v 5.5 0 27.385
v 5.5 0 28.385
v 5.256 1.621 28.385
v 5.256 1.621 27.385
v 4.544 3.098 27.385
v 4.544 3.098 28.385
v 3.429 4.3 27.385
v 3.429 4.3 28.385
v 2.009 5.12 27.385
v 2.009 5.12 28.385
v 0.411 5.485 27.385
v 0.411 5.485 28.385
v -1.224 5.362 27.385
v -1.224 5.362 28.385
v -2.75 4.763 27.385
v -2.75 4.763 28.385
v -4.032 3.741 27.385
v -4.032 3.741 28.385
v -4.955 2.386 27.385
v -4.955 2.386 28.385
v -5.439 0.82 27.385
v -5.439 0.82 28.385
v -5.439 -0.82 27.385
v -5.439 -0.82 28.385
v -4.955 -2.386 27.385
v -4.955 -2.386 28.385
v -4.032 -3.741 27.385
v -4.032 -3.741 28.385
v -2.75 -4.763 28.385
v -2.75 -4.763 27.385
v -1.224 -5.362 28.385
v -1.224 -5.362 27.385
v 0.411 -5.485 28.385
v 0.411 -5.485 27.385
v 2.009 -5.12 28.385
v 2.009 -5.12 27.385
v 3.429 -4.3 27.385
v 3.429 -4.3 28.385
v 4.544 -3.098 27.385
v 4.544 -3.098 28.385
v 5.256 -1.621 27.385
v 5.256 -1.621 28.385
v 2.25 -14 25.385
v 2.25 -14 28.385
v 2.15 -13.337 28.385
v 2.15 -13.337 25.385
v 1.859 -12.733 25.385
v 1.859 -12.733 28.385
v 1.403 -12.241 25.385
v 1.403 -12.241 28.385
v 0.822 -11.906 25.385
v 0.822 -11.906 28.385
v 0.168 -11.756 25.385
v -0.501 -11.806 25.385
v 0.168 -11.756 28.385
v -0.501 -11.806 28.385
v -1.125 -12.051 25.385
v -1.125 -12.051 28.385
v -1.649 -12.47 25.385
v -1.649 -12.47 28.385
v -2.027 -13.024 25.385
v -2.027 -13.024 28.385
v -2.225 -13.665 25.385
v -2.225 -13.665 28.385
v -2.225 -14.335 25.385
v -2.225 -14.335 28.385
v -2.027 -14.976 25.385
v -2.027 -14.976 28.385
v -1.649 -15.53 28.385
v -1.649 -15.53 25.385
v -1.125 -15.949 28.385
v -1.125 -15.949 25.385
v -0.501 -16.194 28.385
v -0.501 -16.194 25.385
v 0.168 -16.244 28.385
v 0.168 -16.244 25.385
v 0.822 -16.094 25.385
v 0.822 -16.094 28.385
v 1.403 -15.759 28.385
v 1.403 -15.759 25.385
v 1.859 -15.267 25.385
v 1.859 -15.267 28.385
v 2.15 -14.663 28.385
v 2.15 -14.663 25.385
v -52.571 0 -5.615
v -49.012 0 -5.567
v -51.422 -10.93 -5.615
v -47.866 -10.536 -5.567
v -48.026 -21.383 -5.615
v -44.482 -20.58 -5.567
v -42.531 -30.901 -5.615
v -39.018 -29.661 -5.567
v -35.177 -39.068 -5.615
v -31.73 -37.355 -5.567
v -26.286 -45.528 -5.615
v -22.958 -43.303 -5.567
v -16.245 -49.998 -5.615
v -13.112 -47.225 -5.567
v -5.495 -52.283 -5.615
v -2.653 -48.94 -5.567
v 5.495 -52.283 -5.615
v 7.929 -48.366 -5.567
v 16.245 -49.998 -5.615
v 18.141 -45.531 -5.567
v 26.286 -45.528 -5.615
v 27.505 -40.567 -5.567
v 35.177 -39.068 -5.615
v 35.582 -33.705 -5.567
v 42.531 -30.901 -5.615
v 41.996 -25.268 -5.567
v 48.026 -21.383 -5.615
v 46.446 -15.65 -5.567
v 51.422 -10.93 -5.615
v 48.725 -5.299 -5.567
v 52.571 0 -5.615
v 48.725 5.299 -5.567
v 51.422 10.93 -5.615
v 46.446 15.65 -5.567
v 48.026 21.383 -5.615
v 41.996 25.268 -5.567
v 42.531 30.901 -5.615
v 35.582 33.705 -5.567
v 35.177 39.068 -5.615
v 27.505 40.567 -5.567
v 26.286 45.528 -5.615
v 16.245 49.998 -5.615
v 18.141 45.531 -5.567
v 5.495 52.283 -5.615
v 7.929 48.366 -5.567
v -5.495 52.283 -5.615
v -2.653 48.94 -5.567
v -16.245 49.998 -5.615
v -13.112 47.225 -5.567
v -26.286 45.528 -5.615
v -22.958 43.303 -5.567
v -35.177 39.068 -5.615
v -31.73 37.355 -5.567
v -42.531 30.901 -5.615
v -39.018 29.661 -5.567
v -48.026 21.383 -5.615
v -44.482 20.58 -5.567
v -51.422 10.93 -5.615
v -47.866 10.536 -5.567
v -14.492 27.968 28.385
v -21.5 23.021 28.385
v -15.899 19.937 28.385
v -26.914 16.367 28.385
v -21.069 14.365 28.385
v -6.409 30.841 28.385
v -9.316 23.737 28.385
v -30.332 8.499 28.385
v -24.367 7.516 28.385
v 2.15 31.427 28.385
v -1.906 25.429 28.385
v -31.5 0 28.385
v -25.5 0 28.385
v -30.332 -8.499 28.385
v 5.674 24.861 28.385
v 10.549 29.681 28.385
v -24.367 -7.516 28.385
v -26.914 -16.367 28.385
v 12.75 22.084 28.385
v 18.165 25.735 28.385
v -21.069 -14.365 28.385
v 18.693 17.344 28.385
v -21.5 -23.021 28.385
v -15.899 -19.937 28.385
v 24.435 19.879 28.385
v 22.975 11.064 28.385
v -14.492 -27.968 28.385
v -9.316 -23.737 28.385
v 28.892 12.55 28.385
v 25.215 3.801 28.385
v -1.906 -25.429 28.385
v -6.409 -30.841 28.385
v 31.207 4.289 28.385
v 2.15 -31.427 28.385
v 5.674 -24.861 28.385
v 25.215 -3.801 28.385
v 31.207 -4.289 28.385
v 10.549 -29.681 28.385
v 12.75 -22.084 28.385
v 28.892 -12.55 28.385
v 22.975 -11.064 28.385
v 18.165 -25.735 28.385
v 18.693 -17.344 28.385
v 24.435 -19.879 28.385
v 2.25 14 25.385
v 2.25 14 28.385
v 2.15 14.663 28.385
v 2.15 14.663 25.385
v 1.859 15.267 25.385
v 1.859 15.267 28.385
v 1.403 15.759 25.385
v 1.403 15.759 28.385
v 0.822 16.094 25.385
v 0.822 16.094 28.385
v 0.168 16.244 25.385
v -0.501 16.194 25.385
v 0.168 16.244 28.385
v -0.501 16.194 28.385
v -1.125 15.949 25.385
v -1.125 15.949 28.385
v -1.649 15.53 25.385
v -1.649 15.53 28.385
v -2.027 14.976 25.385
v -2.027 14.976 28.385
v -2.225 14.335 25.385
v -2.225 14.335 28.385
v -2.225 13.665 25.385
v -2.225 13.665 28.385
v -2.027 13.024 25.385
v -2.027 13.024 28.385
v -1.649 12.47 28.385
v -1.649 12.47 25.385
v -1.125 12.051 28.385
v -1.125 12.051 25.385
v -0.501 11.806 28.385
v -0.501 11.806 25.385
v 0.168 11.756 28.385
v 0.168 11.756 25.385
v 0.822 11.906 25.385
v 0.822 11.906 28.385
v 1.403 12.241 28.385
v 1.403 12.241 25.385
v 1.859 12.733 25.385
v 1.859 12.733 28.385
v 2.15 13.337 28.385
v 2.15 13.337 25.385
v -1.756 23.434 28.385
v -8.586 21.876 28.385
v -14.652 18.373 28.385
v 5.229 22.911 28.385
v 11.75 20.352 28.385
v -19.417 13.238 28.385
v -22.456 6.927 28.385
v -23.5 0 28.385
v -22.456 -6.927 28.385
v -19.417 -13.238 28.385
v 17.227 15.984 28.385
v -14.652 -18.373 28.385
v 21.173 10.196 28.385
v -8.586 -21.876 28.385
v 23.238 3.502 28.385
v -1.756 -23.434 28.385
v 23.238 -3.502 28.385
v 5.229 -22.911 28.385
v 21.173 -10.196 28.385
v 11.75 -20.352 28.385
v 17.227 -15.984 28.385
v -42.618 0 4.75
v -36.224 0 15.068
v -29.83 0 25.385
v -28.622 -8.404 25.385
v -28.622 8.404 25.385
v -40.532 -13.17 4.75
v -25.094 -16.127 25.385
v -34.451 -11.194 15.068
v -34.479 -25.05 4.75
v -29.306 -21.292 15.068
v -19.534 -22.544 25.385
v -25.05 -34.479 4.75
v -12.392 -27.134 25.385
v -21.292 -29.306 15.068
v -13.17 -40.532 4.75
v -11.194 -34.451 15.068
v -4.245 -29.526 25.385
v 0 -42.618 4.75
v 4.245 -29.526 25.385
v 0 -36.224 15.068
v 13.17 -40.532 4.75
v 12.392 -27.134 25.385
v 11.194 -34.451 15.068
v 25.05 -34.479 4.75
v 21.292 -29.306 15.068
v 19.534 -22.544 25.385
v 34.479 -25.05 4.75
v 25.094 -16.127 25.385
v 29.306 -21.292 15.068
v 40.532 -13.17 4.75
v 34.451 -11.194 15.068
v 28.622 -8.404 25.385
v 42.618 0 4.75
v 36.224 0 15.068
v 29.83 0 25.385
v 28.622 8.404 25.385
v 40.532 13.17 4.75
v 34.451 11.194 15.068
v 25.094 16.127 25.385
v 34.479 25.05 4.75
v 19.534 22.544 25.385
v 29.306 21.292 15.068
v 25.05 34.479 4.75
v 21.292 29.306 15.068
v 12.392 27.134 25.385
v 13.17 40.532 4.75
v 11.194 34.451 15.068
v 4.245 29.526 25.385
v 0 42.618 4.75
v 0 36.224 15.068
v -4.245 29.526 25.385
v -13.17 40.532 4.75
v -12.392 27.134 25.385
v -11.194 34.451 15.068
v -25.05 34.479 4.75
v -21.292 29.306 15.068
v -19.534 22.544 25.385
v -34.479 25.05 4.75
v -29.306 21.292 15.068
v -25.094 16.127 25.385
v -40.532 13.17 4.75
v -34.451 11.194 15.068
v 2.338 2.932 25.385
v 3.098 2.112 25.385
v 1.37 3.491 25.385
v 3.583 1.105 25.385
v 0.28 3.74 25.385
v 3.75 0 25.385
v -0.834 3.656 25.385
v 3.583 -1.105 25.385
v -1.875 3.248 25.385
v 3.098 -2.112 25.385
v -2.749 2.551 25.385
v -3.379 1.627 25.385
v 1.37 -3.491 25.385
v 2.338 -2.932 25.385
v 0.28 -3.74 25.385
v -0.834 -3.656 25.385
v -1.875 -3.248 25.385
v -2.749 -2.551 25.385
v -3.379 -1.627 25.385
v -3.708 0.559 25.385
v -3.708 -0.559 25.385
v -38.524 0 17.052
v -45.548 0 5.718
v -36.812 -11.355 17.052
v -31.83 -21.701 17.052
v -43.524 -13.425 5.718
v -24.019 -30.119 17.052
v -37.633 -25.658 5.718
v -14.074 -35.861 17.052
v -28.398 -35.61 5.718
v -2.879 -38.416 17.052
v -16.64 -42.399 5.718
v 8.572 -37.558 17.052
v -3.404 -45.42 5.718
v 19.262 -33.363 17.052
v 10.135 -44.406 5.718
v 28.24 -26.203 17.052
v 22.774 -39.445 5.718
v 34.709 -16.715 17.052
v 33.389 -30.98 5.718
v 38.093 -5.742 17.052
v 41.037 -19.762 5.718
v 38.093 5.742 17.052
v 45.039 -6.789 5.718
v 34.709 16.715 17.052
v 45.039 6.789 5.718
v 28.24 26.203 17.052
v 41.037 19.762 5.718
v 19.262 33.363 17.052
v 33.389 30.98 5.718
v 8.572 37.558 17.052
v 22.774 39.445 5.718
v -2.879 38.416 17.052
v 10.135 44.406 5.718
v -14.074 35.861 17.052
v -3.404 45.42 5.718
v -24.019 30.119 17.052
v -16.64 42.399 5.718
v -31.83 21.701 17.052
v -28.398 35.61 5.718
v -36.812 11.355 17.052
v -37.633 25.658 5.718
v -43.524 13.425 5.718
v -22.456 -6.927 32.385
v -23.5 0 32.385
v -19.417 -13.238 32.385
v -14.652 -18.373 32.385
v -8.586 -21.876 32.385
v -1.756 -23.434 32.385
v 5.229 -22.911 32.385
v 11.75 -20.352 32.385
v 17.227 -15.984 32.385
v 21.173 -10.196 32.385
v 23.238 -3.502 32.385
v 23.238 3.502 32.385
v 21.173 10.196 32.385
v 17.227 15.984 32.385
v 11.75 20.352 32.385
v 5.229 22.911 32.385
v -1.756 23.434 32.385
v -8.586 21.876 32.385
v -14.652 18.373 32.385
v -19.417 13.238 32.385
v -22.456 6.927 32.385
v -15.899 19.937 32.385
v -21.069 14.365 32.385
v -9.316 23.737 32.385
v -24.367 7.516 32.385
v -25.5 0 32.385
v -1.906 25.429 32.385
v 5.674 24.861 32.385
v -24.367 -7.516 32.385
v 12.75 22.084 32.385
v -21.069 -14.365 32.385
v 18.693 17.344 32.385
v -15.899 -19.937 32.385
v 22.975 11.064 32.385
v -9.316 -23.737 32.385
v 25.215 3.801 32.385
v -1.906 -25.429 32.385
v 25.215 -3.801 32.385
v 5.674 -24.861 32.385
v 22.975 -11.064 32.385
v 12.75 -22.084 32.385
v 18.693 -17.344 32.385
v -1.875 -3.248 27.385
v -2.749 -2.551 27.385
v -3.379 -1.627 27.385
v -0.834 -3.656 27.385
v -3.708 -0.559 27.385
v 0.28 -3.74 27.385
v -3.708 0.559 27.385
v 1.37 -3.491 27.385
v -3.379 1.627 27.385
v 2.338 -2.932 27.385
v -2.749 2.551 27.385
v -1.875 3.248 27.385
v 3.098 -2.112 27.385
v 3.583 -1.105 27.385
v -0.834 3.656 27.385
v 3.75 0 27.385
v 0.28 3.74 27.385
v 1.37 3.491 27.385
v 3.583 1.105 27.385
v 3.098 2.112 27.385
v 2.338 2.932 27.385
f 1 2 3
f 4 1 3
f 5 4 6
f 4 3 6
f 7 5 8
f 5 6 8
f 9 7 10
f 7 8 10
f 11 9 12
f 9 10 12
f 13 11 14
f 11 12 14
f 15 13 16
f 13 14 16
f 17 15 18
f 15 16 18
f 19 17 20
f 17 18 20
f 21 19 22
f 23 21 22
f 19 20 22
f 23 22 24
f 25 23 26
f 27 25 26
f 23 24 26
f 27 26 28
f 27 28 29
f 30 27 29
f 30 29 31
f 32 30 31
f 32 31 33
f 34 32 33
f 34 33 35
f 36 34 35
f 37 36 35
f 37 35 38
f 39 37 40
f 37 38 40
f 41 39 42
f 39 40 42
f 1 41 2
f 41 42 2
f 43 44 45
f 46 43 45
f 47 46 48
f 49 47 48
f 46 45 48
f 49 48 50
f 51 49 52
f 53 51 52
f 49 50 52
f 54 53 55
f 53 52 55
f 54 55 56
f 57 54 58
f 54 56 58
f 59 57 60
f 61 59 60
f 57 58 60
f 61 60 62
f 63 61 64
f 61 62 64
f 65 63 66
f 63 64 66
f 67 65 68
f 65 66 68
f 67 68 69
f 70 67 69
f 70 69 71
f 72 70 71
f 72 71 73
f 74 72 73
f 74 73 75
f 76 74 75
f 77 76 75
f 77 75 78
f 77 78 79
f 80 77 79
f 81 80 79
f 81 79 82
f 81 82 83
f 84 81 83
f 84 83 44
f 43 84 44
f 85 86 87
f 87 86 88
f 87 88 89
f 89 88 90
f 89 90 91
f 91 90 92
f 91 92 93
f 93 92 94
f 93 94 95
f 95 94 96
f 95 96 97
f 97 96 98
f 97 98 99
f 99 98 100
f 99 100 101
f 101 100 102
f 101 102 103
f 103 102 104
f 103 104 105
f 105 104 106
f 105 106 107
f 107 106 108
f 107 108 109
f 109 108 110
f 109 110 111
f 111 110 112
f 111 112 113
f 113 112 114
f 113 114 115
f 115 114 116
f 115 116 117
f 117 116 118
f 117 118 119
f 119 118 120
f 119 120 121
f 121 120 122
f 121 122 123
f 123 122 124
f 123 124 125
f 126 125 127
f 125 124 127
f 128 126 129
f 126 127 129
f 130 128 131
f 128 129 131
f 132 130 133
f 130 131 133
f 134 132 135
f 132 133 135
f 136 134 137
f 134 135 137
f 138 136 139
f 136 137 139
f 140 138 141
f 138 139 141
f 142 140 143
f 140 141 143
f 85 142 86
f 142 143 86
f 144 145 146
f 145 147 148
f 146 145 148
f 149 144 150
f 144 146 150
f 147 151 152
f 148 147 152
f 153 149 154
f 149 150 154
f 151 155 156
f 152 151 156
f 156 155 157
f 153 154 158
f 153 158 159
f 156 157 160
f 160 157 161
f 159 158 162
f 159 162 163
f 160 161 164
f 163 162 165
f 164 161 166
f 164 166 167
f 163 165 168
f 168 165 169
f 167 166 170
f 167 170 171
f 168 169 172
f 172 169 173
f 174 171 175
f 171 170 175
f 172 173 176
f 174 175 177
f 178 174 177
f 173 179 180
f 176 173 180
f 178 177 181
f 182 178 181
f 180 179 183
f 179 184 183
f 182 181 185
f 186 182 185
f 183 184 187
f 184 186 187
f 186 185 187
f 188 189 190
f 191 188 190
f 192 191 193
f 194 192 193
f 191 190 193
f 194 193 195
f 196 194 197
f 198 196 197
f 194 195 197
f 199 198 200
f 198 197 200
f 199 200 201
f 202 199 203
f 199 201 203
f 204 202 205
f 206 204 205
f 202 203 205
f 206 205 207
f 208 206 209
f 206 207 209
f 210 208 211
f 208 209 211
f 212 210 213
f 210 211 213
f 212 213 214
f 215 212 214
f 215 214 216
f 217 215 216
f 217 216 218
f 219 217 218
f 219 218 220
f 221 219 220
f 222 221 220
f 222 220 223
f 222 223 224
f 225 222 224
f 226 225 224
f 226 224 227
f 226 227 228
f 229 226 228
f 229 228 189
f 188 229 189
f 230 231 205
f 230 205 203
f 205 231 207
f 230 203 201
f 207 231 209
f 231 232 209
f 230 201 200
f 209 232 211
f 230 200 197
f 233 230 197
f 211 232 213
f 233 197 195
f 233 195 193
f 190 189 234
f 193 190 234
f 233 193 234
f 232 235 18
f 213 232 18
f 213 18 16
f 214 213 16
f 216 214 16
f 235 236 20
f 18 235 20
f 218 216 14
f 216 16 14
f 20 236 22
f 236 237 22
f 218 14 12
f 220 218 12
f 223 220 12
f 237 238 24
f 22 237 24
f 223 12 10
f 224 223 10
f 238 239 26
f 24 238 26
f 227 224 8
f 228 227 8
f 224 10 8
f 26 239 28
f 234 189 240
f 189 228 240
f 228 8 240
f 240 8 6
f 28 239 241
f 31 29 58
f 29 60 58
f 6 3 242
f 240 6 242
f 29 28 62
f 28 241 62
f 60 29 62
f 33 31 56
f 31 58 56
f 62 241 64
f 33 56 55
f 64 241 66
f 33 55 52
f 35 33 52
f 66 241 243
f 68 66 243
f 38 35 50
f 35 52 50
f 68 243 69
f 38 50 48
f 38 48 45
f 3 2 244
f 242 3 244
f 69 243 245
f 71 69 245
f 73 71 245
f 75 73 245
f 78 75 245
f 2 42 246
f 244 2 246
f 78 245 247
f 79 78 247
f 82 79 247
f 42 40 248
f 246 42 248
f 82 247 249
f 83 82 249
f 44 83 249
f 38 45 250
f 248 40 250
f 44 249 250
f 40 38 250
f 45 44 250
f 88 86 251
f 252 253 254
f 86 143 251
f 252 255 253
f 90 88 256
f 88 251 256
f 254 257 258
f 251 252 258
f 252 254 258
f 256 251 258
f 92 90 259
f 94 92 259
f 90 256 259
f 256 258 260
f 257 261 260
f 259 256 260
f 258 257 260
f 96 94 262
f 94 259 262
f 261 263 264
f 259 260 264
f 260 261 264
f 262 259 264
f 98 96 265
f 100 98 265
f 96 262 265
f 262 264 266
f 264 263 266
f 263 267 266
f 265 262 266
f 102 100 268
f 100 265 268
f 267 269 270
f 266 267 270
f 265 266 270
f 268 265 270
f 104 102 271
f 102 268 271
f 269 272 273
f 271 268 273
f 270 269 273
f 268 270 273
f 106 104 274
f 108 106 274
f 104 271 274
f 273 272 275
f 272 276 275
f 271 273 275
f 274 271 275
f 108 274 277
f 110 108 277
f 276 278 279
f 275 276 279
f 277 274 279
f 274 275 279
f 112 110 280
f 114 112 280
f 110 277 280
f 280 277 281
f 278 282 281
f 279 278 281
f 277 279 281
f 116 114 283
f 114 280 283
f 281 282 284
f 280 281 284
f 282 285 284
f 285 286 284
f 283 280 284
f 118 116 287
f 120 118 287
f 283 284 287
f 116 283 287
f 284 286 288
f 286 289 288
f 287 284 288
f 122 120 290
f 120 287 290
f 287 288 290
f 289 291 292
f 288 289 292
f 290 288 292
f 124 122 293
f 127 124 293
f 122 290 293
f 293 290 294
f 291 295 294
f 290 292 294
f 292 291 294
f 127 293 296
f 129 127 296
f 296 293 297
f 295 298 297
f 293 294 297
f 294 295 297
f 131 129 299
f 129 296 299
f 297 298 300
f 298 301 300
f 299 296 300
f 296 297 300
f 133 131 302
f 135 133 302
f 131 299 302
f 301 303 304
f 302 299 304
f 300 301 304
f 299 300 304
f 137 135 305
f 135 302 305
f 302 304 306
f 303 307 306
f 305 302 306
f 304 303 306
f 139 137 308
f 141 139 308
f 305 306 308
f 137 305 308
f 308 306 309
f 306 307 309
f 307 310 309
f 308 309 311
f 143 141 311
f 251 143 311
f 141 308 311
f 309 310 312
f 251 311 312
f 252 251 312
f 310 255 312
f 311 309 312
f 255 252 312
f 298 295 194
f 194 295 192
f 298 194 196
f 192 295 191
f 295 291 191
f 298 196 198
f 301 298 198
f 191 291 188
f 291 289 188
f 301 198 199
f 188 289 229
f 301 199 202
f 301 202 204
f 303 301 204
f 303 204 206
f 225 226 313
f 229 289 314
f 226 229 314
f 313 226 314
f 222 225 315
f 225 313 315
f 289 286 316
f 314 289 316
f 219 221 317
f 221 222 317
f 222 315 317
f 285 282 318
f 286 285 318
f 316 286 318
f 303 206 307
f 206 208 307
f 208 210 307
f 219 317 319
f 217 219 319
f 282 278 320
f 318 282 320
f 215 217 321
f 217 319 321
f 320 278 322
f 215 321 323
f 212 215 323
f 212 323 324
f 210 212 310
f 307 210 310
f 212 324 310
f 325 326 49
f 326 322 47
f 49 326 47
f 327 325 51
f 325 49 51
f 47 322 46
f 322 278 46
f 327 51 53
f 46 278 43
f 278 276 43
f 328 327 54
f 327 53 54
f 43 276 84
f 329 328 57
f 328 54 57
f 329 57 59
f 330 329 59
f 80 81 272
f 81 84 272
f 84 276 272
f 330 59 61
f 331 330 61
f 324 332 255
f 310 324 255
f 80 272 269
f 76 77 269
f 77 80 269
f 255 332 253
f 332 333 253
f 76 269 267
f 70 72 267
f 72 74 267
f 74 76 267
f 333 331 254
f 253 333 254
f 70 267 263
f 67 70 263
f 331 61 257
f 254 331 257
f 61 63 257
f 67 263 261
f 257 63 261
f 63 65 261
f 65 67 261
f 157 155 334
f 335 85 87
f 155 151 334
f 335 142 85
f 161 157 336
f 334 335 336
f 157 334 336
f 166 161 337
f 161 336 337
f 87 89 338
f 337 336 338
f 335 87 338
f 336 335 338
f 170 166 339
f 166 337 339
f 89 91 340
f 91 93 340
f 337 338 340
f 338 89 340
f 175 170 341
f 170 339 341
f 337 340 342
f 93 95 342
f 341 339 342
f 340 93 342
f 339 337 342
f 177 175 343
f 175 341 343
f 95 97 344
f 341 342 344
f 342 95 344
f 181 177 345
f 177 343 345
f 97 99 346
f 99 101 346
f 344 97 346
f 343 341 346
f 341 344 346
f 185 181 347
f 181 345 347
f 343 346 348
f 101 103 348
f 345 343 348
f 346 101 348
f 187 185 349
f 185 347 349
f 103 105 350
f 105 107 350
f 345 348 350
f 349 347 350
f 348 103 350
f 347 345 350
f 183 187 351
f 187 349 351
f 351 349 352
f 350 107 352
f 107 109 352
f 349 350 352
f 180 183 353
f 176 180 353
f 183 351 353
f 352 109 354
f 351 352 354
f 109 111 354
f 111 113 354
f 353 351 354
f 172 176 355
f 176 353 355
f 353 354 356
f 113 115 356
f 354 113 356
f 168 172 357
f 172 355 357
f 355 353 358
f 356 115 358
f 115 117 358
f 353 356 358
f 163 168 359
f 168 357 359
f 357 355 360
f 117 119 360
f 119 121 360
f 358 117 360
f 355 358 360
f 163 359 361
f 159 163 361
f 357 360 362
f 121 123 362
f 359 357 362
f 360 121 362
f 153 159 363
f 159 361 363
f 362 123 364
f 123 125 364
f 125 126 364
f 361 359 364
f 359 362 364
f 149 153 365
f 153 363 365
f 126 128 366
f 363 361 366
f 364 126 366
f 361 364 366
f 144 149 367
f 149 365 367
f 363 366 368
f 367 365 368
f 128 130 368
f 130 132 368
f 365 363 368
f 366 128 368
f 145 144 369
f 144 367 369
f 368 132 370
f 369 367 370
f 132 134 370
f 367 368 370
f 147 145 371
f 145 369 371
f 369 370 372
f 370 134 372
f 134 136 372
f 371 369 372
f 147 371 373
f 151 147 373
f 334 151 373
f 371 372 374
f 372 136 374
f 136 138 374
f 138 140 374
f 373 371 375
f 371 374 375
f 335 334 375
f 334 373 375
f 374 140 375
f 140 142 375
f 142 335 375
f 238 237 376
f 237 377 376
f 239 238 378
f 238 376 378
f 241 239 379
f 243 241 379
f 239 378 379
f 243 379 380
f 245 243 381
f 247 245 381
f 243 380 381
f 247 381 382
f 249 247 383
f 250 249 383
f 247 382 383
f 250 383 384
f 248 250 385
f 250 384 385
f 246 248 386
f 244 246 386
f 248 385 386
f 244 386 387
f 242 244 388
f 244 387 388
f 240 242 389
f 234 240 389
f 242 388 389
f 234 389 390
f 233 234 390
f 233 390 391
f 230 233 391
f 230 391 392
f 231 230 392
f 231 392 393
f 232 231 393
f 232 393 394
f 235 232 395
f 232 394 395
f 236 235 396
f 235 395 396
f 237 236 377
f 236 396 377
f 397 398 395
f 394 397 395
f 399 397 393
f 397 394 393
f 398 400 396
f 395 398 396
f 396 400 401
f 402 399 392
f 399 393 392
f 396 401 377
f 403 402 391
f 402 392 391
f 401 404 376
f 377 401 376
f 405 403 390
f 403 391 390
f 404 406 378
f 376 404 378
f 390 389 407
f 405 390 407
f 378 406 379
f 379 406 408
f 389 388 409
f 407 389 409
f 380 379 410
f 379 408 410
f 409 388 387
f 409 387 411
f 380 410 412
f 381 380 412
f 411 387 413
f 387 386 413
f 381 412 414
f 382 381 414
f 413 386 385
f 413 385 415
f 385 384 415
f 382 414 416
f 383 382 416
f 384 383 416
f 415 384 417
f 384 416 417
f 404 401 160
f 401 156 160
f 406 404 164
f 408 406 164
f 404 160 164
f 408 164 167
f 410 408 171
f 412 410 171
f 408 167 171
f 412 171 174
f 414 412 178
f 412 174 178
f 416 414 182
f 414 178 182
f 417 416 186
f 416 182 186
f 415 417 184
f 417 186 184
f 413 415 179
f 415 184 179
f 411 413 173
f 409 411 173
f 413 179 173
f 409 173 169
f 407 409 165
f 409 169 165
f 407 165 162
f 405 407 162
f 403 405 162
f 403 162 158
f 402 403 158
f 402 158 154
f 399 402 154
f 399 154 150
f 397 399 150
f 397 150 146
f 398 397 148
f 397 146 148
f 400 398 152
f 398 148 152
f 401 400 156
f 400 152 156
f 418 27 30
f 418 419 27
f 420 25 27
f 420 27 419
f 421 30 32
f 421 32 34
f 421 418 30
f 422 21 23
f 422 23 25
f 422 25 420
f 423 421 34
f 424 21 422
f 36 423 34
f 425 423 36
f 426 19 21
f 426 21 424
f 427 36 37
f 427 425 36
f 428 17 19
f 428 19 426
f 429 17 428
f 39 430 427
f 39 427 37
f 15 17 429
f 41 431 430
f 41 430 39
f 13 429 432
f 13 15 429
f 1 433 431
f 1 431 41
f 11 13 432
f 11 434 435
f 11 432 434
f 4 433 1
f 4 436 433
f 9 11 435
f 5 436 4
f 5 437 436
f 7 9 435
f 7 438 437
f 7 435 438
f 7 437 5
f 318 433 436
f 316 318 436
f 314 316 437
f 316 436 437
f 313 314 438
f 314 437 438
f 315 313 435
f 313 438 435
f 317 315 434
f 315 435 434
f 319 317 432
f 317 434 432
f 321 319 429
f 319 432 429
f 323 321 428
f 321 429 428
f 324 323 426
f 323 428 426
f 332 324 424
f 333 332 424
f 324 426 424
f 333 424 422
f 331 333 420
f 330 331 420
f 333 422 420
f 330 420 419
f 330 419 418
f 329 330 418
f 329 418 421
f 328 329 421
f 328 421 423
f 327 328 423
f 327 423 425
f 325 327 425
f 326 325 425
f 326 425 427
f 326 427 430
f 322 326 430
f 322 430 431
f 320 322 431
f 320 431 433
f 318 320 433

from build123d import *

# Parameters (mm, degrees)
F2_R     = 3.75
F2_R_2   = 2.25
F3_DEPTH = 25
F4_R     = 5.5
F5_DEPTH = 1


with BuildPart() as f1:
    # F0 (on Front) → F1 (revolve)
    with BuildSketch(Plane.XZ):
        Polygon((-23.5, 28.38492), (-23.5, 32.384921), (-25.5, 32.384921), (-25.5, 28.38492), (-31.5, 28.38492), (-52.571308, -5.61508), (-49.011947, -5.566755), (-29.829821, 25.38492), (0, 25.38492), (0, 28.38492), align=None)
    revolve(axis=Axis((0, 0, 26.88492), (0, 0, 1)))

    # F2 (on face) → F3 (cut)
    with BuildSketch(Plane.XY.offset(28.38492)):
        Circle(F2_R)
        with Locations((0, -14)):
            Circle(F2_R_2)
        with Locations((0, 14)):
            Circle(F2_R_2)
    extrude(amount=-F3_DEPTH, mode=Mode.SUBTRACT)

    # F4 (on face) → F5 (cut)
    with BuildSketch(Plane.XY.offset(28.38492)):
        Circle(F4_R)
    extrude(amount=-F5_DEPTH, mode=Mode.SUBTRACT)


solid = f1.part
